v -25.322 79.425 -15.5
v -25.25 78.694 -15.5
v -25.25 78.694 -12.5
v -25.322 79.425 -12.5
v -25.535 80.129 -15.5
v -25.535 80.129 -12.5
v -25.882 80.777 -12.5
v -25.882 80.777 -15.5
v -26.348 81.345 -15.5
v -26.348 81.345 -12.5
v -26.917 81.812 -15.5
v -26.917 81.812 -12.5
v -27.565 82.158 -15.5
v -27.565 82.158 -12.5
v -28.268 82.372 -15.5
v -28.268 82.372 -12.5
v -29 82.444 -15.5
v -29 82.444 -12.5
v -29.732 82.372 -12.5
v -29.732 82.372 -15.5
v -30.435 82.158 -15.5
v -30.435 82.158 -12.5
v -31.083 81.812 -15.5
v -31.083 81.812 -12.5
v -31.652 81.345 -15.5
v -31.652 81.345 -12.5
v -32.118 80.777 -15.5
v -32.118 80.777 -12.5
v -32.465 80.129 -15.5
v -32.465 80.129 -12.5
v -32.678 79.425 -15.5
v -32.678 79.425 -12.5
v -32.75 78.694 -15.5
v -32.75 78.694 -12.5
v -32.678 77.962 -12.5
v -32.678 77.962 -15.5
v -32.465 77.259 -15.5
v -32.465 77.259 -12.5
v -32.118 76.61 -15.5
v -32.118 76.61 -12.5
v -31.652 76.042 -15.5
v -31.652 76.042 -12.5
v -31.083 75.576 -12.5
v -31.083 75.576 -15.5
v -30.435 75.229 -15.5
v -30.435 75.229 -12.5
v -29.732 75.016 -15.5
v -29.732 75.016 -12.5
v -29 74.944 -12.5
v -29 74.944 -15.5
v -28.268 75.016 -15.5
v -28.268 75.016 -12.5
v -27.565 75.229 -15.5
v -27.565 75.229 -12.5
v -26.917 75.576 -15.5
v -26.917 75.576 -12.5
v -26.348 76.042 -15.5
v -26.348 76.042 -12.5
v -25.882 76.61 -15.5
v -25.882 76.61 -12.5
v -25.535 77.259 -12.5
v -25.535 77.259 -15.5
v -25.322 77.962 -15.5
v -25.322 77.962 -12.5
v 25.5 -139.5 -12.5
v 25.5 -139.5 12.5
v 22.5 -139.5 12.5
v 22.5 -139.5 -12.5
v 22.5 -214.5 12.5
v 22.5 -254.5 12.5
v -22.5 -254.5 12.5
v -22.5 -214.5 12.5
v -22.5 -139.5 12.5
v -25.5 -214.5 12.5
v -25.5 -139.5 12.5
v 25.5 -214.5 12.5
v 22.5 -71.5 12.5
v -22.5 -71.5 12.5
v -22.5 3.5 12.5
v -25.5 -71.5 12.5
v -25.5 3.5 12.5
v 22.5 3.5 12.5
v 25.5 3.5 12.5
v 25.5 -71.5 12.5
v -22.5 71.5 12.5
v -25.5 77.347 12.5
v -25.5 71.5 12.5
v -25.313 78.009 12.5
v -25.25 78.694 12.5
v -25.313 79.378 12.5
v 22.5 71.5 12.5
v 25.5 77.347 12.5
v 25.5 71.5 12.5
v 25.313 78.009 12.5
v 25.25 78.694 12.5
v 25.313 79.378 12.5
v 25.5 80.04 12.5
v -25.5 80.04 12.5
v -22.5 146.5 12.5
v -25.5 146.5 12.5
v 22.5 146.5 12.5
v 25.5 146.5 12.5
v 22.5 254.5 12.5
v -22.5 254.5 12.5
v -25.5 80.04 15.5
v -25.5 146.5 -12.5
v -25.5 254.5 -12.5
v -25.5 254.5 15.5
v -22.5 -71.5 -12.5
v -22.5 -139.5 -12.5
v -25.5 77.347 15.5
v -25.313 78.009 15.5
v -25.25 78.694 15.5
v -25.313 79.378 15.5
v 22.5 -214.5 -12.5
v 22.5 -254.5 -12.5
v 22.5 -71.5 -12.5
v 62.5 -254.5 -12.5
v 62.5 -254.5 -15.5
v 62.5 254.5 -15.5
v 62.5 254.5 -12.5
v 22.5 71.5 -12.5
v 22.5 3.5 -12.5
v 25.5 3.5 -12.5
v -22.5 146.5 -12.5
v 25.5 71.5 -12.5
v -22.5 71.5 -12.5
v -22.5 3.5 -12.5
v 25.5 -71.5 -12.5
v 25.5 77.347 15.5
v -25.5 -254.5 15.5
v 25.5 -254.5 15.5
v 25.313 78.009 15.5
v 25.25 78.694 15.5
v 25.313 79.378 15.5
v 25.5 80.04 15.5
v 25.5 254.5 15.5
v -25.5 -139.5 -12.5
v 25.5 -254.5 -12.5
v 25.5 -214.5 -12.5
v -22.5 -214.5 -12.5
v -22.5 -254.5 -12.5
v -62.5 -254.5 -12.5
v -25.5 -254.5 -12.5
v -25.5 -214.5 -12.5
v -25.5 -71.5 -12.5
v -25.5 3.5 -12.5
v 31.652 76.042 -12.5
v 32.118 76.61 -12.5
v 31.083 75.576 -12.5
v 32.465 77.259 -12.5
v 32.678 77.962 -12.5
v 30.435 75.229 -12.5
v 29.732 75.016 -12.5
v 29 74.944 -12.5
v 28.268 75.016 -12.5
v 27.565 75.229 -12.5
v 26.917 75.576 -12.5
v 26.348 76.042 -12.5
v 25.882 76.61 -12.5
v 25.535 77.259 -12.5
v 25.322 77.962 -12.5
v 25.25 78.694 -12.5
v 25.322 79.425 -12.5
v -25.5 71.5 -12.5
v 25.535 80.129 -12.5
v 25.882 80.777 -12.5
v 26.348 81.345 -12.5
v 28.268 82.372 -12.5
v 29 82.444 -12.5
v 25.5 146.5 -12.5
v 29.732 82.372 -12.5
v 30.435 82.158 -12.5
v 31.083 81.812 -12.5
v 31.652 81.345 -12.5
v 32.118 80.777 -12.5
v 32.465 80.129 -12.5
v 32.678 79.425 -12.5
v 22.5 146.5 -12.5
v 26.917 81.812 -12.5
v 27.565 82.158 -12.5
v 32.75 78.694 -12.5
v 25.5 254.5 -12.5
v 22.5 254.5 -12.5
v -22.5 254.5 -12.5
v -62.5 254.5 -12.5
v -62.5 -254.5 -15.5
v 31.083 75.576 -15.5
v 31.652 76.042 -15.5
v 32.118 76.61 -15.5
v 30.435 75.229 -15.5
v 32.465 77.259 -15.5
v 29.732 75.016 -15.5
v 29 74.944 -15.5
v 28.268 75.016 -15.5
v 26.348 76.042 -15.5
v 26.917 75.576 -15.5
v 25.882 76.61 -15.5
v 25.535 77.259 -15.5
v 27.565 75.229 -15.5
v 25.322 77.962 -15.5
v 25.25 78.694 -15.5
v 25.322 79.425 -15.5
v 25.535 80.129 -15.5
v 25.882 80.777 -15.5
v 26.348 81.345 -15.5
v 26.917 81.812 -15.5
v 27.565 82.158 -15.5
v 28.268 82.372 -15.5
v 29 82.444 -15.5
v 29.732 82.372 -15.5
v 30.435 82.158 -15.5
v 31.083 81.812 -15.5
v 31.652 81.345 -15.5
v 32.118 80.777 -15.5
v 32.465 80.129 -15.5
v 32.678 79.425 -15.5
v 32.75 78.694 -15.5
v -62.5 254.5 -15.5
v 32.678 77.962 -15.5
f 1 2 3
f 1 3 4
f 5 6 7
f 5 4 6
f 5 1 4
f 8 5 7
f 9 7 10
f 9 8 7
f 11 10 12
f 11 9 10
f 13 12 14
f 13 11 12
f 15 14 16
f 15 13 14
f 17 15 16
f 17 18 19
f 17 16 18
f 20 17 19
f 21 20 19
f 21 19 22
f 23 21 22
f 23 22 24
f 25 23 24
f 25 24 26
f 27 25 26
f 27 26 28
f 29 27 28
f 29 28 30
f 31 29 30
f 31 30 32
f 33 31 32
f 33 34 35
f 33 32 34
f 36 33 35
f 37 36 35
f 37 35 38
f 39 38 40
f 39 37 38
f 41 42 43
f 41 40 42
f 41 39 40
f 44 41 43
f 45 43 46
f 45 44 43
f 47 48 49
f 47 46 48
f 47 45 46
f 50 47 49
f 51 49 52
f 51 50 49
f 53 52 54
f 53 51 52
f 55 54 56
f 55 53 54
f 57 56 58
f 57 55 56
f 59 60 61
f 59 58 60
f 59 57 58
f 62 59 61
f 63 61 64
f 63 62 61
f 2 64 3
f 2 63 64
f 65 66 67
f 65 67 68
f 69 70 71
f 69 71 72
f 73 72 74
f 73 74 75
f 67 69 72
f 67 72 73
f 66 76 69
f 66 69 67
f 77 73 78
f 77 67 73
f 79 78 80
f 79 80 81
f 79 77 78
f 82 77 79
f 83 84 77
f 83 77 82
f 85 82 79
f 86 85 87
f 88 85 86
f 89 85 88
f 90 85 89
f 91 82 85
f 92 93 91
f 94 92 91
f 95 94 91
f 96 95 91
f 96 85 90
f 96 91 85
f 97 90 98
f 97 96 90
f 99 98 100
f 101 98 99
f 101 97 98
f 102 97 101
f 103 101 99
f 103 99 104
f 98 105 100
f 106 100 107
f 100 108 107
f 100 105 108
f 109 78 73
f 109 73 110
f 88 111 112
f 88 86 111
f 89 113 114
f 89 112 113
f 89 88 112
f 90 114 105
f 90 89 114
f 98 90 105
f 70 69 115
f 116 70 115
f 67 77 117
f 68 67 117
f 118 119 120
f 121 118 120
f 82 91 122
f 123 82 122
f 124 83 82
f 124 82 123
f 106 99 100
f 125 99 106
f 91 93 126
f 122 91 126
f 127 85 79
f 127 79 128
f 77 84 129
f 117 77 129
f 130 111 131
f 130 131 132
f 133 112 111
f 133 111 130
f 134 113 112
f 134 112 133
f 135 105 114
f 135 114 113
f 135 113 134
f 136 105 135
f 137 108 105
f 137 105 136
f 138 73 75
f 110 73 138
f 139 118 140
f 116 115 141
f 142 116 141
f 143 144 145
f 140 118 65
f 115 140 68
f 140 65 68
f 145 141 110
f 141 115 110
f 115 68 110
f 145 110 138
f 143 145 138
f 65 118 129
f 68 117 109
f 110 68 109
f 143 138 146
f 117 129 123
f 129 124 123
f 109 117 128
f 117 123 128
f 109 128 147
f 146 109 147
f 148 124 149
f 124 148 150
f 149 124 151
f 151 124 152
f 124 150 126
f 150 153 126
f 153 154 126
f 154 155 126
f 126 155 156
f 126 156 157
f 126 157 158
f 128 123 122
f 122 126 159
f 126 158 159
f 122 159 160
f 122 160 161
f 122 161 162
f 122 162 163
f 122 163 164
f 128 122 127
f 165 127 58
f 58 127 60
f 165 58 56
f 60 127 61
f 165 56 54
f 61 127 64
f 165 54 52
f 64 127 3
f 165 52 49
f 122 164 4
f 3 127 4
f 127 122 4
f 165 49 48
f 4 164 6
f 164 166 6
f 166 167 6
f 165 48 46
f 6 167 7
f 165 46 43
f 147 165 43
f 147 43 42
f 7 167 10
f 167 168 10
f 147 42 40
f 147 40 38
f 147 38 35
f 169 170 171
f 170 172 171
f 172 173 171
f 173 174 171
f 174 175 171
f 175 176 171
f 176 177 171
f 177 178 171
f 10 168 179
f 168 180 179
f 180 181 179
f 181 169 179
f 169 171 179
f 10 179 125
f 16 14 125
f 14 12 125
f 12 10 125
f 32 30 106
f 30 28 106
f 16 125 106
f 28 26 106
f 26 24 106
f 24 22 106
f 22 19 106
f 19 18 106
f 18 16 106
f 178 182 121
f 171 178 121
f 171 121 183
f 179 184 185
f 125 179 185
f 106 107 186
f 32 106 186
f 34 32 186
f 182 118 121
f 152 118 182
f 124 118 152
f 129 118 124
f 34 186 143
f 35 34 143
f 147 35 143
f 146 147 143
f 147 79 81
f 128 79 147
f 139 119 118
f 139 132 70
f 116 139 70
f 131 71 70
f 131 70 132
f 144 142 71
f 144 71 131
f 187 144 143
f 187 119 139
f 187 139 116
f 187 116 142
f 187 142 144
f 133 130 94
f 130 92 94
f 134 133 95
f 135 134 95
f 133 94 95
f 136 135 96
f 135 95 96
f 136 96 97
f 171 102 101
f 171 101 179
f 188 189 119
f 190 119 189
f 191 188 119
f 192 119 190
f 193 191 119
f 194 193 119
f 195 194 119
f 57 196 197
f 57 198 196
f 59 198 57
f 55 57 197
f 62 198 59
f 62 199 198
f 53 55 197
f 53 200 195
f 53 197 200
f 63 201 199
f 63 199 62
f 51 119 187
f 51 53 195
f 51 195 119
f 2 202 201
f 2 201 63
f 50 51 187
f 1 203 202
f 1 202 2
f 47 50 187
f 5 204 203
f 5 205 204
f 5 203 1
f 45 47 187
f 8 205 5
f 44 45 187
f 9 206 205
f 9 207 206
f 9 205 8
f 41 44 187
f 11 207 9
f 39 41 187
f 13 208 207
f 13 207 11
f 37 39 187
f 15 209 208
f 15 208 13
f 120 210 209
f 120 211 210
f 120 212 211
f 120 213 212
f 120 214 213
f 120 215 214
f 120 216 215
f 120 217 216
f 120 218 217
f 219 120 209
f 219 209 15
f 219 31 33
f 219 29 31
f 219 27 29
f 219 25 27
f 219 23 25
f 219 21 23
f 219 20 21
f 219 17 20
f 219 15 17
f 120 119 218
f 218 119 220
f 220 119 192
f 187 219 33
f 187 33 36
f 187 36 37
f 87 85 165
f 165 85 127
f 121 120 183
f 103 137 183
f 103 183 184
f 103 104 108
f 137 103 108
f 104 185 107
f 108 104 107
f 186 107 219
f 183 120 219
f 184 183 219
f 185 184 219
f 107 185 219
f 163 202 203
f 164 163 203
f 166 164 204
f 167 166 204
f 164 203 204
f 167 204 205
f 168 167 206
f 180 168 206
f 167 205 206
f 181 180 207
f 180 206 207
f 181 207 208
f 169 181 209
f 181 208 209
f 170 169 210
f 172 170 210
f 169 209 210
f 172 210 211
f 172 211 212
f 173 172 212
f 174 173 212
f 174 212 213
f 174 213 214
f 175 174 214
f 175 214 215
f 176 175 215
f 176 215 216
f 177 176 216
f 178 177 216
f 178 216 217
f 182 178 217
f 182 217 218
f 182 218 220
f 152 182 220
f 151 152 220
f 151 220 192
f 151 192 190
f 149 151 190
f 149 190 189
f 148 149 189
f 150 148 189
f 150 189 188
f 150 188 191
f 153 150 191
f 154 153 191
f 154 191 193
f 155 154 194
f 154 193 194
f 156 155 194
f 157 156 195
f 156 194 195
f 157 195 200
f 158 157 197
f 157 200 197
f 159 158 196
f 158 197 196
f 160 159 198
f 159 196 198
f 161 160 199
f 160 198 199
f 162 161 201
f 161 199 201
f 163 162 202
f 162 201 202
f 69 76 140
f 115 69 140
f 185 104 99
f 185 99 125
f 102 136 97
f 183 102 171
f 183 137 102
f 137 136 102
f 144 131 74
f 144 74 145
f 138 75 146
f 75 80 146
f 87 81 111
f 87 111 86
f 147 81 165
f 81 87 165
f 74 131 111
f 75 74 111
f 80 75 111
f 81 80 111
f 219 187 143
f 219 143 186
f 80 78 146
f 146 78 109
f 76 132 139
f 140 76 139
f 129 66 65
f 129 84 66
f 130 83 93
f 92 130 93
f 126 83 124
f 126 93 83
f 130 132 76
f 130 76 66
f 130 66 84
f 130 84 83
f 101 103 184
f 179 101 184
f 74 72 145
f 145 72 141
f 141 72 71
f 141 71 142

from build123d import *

# Parameters (mm, degrees)
CROQUIS1_W                 = 51
CROQUIS1_H                 = 31
CROQUIS1_W_2               = 45
CROQUIS1_H_2               = 25
SALIENTE_EXTRUIR2_DEPTH    = 254.5
CROQUIS3_W                 = 25
CROQUIS3_H                 = 75
CORTAR_EXTRUIR1_DEPTH      = 1
CORTAR_EXTRUIR1_DEPTH_BACK = 52
CROQUIS4_W                 = 37
CROQUIS4_H                 = 509
SALIENTE_EXTRUIR3_DEPTH    = 3
CORTAR_EXTRUIR2_START      = -4
CROQUIS5_R                 = 3.75
CORTAR_EXTRUIR2_DEPTH      = 33


with BuildPart() as part:
    # Croquis1 → Saliente-Extruir2 (new body, symmetric)
    with BuildSketch(Plane(origin=(0, 0, 0), x_dir=(1, 0, 0), z_dir=(0, 1, 0))):
        Rectangle(CROQUIS1_W, CROQUIS1_H)
        Rectangle(CROQUIS1_W_2, CROQUIS1_H_2, mode=Mode.SUBTRACT)
    extrude(amount=SALIENTE_EXTRUIR2_DEPTH, both=True)

    # Croquis3 → Cortar-Extruir1 (cut, two sides)
    with BuildSketch(Plane(origin=(25.5, 0, 0), x_dir=(0, 0, -1), z_dir=(1, 0, 0))) as cortar_extruir1_sk:
        with Locations((0, 109)):
            Rectangle(CROQUIS3_W, CROQUIS3_H)
        with Locations((0, -34)):
            Rectangle(CROQUIS3_W, CROQUIS3_H)
        with Locations((0, -177)):
            Rectangle(CROQUIS3_W, CROQUIS3_H)
    extrude(amount=CORTAR_EXTRUIR1_DEPTH, mode=Mode.SUBTRACT)
    extrude(cortar_extruir1_sk.sketch, amount=-CORTAR_EXTRUIR1_DEPTH_BACK, mode=Mode.SUBTRACT)

    # Croquis4 → Saliente-Extruir3 (add)
    with BuildSketch(Plane(origin=(0, 0, -15.5), x_dir=(-1, 0, 0), z_dir=(0, 0, -1))):
        with Locations((-44, 0)):
            Rectangle(CROQUIS4_W, CROQUIS4_H)
        with Locations((44, 0)):
            Rectangle(CROQUIS4_W, CROQUIS4_H)
    extrude(amount=-SALIENTE_EXTRUIR3_DEPTH)

    # Croquis5 → Cortar-Extruir2 (cut)
    with BuildSketch(Plane.XY.offset(-12.5).offset(CORTAR_EXTRUIR2_START)):
        with Locations((-29, 78.693747285)):
            Circle(CROQUIS5_R)
    cortar_extruir2 = extrude(amount=CORTAR_EXTRUIR2_DEPTH, mode=Mode.SUBTRACT)

    # Simetría1: Cortar-Extruir2 across plane
    add(cortar_extruir2.mirror(Plane(origin=(0, 0, 0), x_dir=(0, 0, 1), z_dir=(1, 0, 0))), mode=Mode.SUBTRACT)


solid = part.part
